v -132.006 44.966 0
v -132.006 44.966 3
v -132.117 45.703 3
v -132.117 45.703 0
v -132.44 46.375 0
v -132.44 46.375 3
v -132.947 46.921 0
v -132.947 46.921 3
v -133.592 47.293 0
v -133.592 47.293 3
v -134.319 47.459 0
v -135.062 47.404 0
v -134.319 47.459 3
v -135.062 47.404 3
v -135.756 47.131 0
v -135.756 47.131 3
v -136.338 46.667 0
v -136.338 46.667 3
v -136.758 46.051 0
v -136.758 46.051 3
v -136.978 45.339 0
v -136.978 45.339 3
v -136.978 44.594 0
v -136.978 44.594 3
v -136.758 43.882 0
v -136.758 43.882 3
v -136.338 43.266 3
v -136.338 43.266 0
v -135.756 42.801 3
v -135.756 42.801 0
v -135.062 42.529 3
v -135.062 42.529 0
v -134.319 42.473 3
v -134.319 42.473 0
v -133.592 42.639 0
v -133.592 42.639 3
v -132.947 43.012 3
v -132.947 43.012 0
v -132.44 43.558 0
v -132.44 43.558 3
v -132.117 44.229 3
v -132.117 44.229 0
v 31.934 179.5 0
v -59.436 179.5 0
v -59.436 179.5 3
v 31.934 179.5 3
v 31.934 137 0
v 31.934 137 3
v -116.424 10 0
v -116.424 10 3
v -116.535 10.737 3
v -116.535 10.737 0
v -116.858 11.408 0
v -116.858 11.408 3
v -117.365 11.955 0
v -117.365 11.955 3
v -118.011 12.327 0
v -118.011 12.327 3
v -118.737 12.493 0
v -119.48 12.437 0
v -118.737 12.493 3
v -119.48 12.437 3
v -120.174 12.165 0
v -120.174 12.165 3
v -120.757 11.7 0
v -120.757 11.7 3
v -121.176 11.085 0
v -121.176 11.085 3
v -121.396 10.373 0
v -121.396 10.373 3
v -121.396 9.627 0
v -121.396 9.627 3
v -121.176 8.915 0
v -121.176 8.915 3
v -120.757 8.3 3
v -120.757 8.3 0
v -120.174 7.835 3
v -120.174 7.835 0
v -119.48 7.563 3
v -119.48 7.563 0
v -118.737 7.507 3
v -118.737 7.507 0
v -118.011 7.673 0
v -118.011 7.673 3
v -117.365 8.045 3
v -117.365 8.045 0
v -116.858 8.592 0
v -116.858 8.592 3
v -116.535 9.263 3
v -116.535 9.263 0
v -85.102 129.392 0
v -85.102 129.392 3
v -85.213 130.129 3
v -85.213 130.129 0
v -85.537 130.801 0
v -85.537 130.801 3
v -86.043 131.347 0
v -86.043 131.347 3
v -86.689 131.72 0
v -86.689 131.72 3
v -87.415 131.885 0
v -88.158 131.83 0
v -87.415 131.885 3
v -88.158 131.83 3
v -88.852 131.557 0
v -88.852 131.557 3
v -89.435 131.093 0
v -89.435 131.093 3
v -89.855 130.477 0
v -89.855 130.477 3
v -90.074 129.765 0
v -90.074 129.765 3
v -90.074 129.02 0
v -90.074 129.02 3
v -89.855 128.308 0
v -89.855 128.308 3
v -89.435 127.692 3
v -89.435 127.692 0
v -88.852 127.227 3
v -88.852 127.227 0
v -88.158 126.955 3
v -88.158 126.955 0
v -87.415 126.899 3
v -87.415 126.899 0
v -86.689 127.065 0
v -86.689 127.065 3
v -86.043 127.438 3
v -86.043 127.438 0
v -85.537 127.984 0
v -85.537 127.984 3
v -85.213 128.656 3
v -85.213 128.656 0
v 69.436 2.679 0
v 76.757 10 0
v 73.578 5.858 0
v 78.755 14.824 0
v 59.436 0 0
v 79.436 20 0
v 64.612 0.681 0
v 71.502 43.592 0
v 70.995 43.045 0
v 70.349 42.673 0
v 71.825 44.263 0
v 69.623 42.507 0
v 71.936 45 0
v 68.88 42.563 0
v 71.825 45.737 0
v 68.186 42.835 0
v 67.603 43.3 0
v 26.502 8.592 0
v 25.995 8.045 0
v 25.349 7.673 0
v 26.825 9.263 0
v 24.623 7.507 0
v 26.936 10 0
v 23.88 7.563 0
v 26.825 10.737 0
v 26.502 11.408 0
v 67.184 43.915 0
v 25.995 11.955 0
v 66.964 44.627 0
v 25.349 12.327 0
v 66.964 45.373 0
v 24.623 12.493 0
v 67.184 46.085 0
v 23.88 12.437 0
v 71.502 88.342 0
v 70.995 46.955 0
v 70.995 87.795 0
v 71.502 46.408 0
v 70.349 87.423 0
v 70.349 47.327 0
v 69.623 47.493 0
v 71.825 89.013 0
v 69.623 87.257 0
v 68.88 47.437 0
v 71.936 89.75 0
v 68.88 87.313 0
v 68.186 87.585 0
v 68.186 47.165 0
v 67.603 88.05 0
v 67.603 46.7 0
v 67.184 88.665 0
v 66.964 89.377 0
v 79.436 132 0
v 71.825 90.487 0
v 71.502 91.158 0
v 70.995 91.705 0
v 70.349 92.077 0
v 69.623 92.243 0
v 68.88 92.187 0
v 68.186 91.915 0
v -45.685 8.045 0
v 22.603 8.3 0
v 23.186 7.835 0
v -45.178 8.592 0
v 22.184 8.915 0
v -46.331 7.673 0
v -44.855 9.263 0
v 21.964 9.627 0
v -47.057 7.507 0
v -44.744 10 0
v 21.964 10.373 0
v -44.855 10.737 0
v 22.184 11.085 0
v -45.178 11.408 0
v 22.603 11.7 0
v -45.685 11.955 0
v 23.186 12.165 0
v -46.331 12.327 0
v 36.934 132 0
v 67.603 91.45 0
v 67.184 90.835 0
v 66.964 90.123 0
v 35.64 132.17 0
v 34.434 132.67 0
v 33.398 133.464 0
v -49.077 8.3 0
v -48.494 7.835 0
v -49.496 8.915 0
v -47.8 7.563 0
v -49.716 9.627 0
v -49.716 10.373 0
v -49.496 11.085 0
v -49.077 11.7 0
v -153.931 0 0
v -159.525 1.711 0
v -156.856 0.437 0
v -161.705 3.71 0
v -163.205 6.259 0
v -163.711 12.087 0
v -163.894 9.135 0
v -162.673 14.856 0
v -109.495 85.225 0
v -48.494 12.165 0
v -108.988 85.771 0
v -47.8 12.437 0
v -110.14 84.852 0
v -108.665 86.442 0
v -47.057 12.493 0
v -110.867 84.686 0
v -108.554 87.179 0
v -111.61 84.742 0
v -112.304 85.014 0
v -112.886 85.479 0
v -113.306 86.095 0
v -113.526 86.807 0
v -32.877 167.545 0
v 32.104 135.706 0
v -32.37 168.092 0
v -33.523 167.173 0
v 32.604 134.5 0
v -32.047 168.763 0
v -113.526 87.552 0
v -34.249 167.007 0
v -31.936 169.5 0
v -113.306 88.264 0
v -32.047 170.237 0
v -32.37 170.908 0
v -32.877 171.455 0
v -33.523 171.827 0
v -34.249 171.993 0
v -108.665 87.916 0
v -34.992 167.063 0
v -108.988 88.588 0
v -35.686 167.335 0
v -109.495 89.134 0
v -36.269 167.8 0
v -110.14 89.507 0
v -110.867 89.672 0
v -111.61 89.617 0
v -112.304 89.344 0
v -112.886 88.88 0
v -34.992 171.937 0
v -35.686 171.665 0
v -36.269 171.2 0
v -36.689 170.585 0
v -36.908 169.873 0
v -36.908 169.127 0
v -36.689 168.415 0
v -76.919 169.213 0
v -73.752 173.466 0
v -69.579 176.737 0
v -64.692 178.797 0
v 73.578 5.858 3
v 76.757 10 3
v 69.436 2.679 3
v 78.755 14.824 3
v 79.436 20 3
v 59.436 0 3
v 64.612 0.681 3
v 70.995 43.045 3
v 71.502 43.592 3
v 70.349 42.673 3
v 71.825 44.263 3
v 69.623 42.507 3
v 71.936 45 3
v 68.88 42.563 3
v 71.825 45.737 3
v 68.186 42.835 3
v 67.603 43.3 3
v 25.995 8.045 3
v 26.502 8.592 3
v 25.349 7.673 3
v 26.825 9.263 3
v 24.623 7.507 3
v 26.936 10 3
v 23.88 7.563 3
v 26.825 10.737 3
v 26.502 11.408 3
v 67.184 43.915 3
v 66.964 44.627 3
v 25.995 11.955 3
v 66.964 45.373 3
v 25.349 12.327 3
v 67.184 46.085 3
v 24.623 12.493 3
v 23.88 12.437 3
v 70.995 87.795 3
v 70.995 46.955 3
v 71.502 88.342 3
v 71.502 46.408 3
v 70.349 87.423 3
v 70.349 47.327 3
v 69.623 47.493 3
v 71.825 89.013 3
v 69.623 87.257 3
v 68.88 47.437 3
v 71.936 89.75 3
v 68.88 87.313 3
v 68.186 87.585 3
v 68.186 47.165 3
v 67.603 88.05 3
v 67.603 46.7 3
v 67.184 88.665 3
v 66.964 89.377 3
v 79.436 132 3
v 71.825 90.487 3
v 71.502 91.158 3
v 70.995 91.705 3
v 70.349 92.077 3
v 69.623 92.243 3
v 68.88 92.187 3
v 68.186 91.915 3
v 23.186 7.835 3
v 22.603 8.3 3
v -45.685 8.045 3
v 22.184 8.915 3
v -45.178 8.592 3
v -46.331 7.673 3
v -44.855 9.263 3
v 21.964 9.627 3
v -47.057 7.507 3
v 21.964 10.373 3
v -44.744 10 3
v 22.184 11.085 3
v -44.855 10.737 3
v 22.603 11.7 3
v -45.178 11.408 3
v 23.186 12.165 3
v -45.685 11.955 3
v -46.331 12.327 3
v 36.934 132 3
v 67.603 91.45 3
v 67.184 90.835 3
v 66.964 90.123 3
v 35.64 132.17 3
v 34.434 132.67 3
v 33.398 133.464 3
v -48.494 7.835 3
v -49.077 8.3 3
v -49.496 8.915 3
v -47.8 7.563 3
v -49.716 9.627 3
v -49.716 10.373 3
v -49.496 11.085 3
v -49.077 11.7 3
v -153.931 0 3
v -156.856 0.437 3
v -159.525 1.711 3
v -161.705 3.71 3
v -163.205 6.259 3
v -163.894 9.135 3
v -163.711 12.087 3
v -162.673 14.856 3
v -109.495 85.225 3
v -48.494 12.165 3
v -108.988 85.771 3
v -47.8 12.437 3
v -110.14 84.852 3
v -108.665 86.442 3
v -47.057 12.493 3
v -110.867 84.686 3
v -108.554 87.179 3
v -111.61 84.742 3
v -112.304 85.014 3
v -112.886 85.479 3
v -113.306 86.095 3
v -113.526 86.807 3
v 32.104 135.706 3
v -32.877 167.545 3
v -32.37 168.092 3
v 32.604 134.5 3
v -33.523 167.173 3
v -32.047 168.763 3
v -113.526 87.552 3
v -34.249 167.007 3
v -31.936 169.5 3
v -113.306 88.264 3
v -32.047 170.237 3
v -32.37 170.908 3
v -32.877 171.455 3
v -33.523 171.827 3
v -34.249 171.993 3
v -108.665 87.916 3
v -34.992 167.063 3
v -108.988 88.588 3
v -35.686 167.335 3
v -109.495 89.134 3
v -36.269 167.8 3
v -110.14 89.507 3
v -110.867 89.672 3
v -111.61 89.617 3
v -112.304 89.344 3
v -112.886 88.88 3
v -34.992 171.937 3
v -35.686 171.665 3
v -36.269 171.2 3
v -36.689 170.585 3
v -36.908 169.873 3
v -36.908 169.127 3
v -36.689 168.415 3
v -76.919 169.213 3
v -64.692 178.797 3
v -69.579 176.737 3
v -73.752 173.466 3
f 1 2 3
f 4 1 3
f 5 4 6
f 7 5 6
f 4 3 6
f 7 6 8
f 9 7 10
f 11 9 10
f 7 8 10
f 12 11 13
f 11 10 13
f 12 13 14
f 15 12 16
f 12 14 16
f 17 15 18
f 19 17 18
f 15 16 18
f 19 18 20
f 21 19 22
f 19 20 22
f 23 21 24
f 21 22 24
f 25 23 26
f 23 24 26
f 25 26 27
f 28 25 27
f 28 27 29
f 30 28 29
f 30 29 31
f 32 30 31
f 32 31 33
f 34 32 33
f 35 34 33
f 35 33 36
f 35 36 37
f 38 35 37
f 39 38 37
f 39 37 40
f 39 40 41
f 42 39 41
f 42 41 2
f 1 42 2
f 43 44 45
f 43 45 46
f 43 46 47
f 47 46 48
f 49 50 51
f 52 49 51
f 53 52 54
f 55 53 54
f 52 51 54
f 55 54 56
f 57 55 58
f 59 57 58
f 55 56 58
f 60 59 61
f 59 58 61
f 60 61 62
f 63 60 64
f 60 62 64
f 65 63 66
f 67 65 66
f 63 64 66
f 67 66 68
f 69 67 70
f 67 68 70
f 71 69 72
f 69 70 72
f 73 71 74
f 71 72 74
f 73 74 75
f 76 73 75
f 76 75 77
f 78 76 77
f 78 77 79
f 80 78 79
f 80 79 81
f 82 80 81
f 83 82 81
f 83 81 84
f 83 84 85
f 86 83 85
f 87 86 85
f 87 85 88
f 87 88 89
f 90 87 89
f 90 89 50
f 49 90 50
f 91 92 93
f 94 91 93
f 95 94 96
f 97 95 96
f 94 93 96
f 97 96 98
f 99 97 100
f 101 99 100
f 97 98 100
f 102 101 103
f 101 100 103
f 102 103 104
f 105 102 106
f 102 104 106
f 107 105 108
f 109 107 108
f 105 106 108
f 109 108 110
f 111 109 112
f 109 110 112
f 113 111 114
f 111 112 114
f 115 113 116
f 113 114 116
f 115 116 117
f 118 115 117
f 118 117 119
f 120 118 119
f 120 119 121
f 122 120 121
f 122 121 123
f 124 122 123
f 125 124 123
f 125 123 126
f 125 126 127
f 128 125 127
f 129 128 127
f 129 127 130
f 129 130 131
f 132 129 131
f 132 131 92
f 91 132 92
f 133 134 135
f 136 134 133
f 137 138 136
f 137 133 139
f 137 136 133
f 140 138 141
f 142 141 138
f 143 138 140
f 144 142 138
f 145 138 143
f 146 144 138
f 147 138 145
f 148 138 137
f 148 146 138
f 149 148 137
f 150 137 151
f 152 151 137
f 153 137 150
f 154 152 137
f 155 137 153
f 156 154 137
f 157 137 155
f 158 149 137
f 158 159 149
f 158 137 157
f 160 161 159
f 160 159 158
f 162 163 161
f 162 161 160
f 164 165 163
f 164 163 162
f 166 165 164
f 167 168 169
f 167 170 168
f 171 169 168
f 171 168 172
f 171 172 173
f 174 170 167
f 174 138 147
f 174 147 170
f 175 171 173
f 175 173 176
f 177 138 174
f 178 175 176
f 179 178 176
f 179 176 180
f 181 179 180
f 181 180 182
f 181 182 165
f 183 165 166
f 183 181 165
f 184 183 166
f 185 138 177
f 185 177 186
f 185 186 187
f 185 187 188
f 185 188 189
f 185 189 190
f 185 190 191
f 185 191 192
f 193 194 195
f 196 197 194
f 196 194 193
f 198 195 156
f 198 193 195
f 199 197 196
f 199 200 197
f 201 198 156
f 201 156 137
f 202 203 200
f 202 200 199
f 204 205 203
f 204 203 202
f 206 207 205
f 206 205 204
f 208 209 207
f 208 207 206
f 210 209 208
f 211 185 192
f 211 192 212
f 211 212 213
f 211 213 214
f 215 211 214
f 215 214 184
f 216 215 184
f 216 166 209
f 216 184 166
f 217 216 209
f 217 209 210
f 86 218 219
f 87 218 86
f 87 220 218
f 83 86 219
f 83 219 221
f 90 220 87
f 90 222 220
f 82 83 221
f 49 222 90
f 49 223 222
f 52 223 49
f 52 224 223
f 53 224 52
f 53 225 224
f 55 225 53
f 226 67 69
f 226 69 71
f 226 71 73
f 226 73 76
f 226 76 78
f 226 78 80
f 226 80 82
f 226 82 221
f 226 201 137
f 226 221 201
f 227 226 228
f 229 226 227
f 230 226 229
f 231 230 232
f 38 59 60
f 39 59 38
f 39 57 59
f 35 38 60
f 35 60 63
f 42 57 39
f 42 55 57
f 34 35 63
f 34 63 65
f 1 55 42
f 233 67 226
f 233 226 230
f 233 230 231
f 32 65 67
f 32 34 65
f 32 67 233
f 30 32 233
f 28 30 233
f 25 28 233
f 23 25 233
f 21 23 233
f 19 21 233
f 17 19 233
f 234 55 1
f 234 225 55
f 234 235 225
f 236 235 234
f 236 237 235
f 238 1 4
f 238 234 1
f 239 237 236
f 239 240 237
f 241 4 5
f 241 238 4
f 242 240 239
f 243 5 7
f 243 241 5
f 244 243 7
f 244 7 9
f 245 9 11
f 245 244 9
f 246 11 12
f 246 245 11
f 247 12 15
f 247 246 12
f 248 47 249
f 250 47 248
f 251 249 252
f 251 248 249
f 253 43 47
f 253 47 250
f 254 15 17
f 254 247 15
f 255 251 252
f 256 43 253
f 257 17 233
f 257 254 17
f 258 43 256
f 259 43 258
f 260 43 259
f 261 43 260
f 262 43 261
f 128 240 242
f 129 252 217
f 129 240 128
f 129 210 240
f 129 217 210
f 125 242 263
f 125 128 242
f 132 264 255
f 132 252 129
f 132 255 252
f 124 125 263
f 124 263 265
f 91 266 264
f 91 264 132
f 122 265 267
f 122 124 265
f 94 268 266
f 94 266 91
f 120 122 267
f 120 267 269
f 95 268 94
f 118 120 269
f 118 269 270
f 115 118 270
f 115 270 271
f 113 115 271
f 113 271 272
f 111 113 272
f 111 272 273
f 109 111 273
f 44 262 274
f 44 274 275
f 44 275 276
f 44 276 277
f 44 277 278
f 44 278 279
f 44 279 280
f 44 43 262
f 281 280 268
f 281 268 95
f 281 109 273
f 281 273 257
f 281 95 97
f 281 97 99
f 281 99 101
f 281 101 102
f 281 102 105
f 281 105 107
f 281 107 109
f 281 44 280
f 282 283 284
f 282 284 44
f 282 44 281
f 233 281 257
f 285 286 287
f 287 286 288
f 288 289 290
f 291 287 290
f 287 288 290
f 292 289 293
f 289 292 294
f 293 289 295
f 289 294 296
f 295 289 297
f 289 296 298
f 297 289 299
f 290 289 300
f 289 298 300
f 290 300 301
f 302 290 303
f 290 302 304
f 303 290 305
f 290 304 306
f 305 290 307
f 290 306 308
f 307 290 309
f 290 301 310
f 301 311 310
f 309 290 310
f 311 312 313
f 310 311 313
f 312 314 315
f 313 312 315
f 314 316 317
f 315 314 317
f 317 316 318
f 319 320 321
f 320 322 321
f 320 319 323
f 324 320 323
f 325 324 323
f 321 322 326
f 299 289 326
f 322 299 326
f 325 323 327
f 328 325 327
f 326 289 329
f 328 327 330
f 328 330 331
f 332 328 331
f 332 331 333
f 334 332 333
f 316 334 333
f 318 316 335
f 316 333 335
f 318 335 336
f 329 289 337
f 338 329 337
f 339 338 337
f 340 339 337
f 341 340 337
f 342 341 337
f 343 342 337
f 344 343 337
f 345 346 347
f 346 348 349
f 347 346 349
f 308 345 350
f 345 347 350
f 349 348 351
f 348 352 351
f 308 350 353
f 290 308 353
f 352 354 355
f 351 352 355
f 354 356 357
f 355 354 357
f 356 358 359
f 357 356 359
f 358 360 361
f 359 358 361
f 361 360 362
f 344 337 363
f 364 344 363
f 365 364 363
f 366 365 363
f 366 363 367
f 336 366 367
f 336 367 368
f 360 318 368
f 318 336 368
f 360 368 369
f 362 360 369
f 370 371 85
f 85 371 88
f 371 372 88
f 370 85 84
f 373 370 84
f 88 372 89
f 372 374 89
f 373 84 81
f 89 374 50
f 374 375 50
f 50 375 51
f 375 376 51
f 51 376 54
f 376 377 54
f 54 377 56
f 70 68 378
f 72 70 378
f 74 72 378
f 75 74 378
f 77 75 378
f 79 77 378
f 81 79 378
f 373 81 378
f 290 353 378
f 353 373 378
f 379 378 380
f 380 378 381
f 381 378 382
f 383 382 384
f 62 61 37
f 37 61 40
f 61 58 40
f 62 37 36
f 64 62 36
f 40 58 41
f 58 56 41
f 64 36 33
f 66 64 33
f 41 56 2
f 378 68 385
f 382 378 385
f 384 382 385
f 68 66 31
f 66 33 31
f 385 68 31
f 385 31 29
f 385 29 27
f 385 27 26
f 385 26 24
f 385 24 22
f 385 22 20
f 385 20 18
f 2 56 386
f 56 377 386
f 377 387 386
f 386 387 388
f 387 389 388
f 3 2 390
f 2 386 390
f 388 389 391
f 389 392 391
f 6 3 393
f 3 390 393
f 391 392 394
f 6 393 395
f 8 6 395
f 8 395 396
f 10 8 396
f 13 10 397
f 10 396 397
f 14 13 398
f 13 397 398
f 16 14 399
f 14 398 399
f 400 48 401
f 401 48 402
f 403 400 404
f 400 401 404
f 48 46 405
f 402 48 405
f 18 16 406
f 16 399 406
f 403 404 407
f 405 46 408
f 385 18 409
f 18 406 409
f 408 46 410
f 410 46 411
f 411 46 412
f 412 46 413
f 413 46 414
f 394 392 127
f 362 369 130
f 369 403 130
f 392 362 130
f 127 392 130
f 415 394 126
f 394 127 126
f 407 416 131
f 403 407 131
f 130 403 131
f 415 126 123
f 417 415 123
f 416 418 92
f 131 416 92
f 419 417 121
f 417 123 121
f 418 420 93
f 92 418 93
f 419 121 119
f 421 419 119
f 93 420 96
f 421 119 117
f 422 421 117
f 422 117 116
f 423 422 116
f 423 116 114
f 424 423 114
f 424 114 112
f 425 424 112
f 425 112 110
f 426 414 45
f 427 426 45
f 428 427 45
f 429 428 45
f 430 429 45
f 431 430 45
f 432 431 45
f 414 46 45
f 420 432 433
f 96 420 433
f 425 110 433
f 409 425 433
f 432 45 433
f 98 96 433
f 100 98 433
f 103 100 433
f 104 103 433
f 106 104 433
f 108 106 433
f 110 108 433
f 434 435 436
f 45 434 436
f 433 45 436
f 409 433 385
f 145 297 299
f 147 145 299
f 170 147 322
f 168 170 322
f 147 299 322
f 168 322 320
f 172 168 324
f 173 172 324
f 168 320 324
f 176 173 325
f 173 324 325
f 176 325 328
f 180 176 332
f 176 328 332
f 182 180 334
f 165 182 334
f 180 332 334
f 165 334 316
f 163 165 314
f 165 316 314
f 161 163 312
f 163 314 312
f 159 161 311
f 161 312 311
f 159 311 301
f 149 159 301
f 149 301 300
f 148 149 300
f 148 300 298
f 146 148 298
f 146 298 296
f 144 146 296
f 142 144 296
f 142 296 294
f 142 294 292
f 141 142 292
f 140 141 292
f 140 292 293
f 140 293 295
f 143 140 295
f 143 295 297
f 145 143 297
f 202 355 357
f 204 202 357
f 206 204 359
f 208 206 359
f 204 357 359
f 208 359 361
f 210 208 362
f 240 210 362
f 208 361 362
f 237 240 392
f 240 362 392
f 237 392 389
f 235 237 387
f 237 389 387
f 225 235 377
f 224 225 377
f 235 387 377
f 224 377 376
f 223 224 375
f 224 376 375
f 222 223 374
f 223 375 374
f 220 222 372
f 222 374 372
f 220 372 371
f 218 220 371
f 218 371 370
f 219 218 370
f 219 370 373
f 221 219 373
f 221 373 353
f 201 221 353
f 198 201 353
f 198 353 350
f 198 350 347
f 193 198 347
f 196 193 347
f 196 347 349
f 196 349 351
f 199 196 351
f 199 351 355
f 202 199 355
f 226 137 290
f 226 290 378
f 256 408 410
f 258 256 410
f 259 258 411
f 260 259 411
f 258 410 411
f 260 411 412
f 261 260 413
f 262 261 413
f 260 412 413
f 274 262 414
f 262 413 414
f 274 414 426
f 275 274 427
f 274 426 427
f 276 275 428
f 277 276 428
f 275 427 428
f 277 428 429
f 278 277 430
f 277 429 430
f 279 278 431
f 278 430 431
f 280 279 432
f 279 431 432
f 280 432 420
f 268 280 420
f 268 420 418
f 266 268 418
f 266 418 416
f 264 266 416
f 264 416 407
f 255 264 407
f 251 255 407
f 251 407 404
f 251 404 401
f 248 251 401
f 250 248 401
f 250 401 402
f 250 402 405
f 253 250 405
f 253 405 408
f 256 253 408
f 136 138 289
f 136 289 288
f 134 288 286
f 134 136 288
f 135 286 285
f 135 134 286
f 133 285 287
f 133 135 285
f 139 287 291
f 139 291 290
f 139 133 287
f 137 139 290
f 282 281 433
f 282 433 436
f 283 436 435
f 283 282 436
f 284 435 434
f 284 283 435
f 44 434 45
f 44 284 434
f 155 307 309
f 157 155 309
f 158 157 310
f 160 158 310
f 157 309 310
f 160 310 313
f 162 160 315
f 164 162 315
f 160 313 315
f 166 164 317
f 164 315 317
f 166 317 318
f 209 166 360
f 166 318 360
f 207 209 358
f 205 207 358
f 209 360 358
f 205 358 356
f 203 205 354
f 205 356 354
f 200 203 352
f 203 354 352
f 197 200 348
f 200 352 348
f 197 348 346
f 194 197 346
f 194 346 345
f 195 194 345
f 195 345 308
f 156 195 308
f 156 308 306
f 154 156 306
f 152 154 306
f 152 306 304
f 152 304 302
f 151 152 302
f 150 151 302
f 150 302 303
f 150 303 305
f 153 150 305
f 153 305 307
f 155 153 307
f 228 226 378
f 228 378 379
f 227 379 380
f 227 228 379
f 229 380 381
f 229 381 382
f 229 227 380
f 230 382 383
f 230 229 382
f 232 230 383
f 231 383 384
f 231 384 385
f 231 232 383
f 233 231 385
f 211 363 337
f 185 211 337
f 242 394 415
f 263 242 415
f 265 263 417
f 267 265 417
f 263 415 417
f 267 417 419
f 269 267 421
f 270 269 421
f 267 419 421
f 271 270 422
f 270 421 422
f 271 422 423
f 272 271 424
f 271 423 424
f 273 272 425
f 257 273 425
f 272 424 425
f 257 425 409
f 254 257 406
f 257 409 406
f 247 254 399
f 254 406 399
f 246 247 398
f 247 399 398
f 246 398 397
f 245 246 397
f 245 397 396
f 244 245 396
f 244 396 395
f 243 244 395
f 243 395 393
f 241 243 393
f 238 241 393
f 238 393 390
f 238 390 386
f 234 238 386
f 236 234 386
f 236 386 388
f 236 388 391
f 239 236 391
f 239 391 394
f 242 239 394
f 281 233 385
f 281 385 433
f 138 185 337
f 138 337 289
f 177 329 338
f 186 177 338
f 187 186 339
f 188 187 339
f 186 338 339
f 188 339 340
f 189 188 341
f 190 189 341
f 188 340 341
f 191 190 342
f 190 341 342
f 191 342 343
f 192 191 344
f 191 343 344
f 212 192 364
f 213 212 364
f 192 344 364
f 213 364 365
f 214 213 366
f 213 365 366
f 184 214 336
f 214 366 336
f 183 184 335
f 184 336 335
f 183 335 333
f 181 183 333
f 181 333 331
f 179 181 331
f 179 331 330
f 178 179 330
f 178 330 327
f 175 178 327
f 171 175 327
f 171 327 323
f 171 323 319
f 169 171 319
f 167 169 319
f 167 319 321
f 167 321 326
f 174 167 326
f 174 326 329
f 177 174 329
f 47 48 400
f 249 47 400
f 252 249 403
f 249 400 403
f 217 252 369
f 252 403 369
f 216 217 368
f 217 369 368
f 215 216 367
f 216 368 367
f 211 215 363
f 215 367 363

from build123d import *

# Parameters (mm, degrees)
BOSS_EXTRUDE1_DEPTH = 3
CUT_EXTRUDE1_REACH  = 245.11
SKETCH2_R           = 2.5
CUT_EXTRUDE2_DEPTH  = 244.110466883


with BuildPart() as part:
    # Sketch1 → Boss-Extrude1 (new body)
    with BuildSketch(Plane.XY):
        with BuildLine():
            Line((-59.436088262, 179.5), (59.436088262, 179.5))
            ThreePointArc((59.436088262, 179.5), (73.578223886, 173.642135624), (79.436088262, 159.5))
            Line((79.436088262, 159.5), (79.436088262, 20))
            ThreePointArc((79.436088262, 20), (73.578223886, 5.857864376), (59.436088262, 0))
            Line((59.436088262, 0), (-153.931232863, 0))
            ThreePointArc((-153.931232863, 0), (-162.549941964, 4.928722701), (-162.672805625, 14.856429312))
            Line((-162.672805625, 14.856429312), (-76.919233785, 169.212858624))
            ThreePointArc((-76.919233785, 169.212858624), (-69.57864286, 176.737418201), (-59.436088262, 179.5))
        make_face()
    extrude(amount=BOSS_EXTRUDE1_DEPTH)

    # Sketch2 → Cut-Extrude1 (cut, up to next)
    with BuildSketch(Plane.XY.offset(3), mode=Mode.PRIVATE) as cut_extrude1_sk1:
        with Locations((-34.436088262, 169.5)):
            Circle(SKETCH2_R)
    cut_extrude1_tool1 = extrude(cut_extrude1_sk1.sketch, amount=-CUT_EXTRUDE1_REACH, mode=Mode.PRIVATE) & part.part
    # Sketch2 → Cut-Extrude1 (cut, up to next)
    with BuildSketch(Plane.XY.offset(3), mode=Mode.PRIVATE) as cut_extrude1_sk2:
        with Locations((34.433911738, 169.5)):
            Circle(SKETCH2_R)
    cut_extrude1_tool2 = extrude(cut_extrude1_sk2.sketch, amount=-CUT_EXTRUDE1_REACH, mode=Mode.PRIVATE) & part.part
    # Sketch2 → Cut-Extrude1 (cut, up to next)
    with BuildSketch(Plane.XY.offset(3), mode=Mode.PRIVATE) as cut_extrude1_sk3:
        with Locations((69.436088262, 134.5)):
            Circle(SKETCH2_R)
    cut_extrude1_tool3 = extrude(cut_extrude1_sk3.sketch, amount=-CUT_EXTRUDE1_REACH, mode=Mode.PRIVATE) & part.part
    # Sketch2 → Cut-Extrude1 (cut, up to next)
    with BuildSketch(Plane.XY.offset(3), mode=Mode.PRIVATE) as cut_extrude1_sk4:
        with Locations((69.436088262, 89.75)):
            Circle(SKETCH2_R)
    cut_extrude1_tool4 = extrude(cut_extrude1_sk4.sketch, amount=-CUT_EXTRUDE1_REACH, mode=Mode.PRIVATE) & part.part
    # Sketch2 → Cut-Extrude1 (cut, up to next)
    with BuildSketch(Plane.XY.offset(3), mode=Mode.PRIVATE) as cut_extrude1_sk5:
        with Locations((69.436088262, 45)):
            Circle(SKETCH2_R)
    cut_extrude1_tool5 = extrude(cut_extrude1_sk5.sketch, amount=-CUT_EXTRUDE1_REACH, mode=Mode.PRIVATE) & part.part
    # Sketch2 → Cut-Extrude1 (cut, up to next)
    with BuildSketch(Plane.XY.offset(3), mode=Mode.PRIVATE) as cut_extrude1_sk6:
        with Locations((24.436088262, 10)):
            Circle(SKETCH2_R)
    cut_extrude1_tool6 = extrude(cut_extrude1_sk6.sketch, amount=-CUT_EXTRUDE1_REACH, mode=Mode.PRIVATE) & part.part
    # Sketch2 → Cut-Extrude1 (cut, up to next)
    with BuildSketch(Plane.XY.offset(3), mode=Mode.PRIVATE) as cut_extrude1_sk7:
        with Locations((-47.243911738, 10)):
            Circle(SKETCH2_R)
    cut_extrude1_tool7 = extrude(cut_extrude1_sk7.sketch, amount=-CUT_EXTRUDE1_REACH, mode=Mode.PRIVATE) & part.part
    # Sketch2 → Cut-Extrude1 (cut, up to next)
    with BuildSketch(Plane.XY.offset(3), mode=Mode.PRIVATE) as cut_extrude1_sk8:
        with Locations((-118.923911738, 10)):
            Circle(SKETCH2_R)
    cut_extrude1_tool8 = extrude(cut_extrude1_sk8.sketch, amount=-CUT_EXTRUDE1_REACH, mode=Mode.PRIVATE) & part.part
    # Sketch2 → Cut-Extrude1 (cut, up to next)
    with BuildSketch(Plane.XY.offset(3), mode=Mode.PRIVATE) as cut_extrude1_sk9:
        with Locations((-134.505515616, 44.966291045)):
            Circle(SKETCH2_R)
    cut_extrude1_tool9 = extrude(cut_extrude1_sk9.sketch, amount=-CUT_EXTRUDE1_REACH, mode=Mode.PRIVATE) & part.part
    # Sketch2 → Cut-Extrude1 (cut, up to next)
    with BuildSketch(Plane.XY.offset(3), mode=Mode.PRIVATE) as cut_extrude1_sk10:
        with Locations((-87.602121323, 129.392400773)):
            Circle(SKETCH2_R)
    cut_extrude1_tool10 = extrude(cut_extrude1_sk10.sketch, amount=-CUT_EXTRUDE1_REACH, mode=Mode.PRIVATE) & part.part
    # Sketch2 → Cut-Extrude1 (cut, up to next)
    with BuildSketch(Plane.XY.offset(3), mode=Mode.PRIVATE) as cut_extrude1_sk11:
        with Locations((-111.05381847, 87.179345909)):
            Circle(SKETCH2_R)
    cut_extrude1_tool11 = extrude(cut_extrude1_sk11.sketch, amount=-CUT_EXTRUDE1_REACH, mode=Mode.PRIVATE) & part.part
    add(cut_extrude1_tool1.solids().sort_by_distance((-34.436088, 169.5, 3))[0], mode=Mode.SUBTRACT)
    add(cut_extrude1_tool2.solids().sort_by_distance((34.433912, 169.5, 3))[0], mode=Mode.SUBTRACT)
    add(cut_extrude1_tool3.solids().sort_by_distance((69.436088, 134.5, 3))[0], mode=Mode.SUBTRACT)
    add(cut_extrude1_tool4.solids().sort_by_distance((69.436088, 89.75, 3))[0], mode=Mode.SUBTRACT)
    add(cut_extrude1_tool5.solids().sort_by_distance((69.436088, 45, 3))[0], mode=Mode.SUBTRACT)
    add(cut_extrude1_tool6.solids().sort_by_distance((24.436088, 10, 3))[0], mode=Mode.SUBTRACT)
    add(cut_extrude1_tool7.solids().sort_by_distance((-47.243912, 10, 3))[0], mode=Mode.SUBTRACT)
    add(cut_extrude1_tool8.solids().sort_by_distance((-118.923912, 10, 3))[0], mode=Mode.SUBTRACT)
    add(cut_extrude1_tool9.solids().sort_by_distance((-134.505516, 44.966291, 3))[0], mode=Mode.SUBTRACT)
    add(cut_extrude1_tool10.solids().sort_by_distance((-87.602121, 129.392401, 3))[0], mode=Mode.SUBTRACT)
    add(cut_extrude1_tool11.solids().sort_by_distance((-111.053818, 87.179346, 3))[0], mode=Mode.SUBTRACT)

    # Sketch3 → Cut-Extrude2 (cut, through all)
    with BuildSketch(Plane.XY.offset(3)):
        with BuildLine():
            Line((31.933911738, 179.5), (31.933911738, 137))
            ThreePointArc((31.933911738, 137), (33.398377832, 133.464466094), (36.933911738, 132))
            Line((36.933911738, 132), (79.436088262, 132))
            Line((79.436088262, 132), (79.436088262, 159.5))
            ThreePointArc((79.436088262, 159.5), (73.578223886, 173.642135624), (59.436088262, 179.5))
            Line((59.436088262, 179.5), (31.933911738, 179.5))
        make_face()
    extrude(amount=-CUT_EXTRUDE2_DEPTH, mode=Mode.SUBTRACT)


solid = part.part
